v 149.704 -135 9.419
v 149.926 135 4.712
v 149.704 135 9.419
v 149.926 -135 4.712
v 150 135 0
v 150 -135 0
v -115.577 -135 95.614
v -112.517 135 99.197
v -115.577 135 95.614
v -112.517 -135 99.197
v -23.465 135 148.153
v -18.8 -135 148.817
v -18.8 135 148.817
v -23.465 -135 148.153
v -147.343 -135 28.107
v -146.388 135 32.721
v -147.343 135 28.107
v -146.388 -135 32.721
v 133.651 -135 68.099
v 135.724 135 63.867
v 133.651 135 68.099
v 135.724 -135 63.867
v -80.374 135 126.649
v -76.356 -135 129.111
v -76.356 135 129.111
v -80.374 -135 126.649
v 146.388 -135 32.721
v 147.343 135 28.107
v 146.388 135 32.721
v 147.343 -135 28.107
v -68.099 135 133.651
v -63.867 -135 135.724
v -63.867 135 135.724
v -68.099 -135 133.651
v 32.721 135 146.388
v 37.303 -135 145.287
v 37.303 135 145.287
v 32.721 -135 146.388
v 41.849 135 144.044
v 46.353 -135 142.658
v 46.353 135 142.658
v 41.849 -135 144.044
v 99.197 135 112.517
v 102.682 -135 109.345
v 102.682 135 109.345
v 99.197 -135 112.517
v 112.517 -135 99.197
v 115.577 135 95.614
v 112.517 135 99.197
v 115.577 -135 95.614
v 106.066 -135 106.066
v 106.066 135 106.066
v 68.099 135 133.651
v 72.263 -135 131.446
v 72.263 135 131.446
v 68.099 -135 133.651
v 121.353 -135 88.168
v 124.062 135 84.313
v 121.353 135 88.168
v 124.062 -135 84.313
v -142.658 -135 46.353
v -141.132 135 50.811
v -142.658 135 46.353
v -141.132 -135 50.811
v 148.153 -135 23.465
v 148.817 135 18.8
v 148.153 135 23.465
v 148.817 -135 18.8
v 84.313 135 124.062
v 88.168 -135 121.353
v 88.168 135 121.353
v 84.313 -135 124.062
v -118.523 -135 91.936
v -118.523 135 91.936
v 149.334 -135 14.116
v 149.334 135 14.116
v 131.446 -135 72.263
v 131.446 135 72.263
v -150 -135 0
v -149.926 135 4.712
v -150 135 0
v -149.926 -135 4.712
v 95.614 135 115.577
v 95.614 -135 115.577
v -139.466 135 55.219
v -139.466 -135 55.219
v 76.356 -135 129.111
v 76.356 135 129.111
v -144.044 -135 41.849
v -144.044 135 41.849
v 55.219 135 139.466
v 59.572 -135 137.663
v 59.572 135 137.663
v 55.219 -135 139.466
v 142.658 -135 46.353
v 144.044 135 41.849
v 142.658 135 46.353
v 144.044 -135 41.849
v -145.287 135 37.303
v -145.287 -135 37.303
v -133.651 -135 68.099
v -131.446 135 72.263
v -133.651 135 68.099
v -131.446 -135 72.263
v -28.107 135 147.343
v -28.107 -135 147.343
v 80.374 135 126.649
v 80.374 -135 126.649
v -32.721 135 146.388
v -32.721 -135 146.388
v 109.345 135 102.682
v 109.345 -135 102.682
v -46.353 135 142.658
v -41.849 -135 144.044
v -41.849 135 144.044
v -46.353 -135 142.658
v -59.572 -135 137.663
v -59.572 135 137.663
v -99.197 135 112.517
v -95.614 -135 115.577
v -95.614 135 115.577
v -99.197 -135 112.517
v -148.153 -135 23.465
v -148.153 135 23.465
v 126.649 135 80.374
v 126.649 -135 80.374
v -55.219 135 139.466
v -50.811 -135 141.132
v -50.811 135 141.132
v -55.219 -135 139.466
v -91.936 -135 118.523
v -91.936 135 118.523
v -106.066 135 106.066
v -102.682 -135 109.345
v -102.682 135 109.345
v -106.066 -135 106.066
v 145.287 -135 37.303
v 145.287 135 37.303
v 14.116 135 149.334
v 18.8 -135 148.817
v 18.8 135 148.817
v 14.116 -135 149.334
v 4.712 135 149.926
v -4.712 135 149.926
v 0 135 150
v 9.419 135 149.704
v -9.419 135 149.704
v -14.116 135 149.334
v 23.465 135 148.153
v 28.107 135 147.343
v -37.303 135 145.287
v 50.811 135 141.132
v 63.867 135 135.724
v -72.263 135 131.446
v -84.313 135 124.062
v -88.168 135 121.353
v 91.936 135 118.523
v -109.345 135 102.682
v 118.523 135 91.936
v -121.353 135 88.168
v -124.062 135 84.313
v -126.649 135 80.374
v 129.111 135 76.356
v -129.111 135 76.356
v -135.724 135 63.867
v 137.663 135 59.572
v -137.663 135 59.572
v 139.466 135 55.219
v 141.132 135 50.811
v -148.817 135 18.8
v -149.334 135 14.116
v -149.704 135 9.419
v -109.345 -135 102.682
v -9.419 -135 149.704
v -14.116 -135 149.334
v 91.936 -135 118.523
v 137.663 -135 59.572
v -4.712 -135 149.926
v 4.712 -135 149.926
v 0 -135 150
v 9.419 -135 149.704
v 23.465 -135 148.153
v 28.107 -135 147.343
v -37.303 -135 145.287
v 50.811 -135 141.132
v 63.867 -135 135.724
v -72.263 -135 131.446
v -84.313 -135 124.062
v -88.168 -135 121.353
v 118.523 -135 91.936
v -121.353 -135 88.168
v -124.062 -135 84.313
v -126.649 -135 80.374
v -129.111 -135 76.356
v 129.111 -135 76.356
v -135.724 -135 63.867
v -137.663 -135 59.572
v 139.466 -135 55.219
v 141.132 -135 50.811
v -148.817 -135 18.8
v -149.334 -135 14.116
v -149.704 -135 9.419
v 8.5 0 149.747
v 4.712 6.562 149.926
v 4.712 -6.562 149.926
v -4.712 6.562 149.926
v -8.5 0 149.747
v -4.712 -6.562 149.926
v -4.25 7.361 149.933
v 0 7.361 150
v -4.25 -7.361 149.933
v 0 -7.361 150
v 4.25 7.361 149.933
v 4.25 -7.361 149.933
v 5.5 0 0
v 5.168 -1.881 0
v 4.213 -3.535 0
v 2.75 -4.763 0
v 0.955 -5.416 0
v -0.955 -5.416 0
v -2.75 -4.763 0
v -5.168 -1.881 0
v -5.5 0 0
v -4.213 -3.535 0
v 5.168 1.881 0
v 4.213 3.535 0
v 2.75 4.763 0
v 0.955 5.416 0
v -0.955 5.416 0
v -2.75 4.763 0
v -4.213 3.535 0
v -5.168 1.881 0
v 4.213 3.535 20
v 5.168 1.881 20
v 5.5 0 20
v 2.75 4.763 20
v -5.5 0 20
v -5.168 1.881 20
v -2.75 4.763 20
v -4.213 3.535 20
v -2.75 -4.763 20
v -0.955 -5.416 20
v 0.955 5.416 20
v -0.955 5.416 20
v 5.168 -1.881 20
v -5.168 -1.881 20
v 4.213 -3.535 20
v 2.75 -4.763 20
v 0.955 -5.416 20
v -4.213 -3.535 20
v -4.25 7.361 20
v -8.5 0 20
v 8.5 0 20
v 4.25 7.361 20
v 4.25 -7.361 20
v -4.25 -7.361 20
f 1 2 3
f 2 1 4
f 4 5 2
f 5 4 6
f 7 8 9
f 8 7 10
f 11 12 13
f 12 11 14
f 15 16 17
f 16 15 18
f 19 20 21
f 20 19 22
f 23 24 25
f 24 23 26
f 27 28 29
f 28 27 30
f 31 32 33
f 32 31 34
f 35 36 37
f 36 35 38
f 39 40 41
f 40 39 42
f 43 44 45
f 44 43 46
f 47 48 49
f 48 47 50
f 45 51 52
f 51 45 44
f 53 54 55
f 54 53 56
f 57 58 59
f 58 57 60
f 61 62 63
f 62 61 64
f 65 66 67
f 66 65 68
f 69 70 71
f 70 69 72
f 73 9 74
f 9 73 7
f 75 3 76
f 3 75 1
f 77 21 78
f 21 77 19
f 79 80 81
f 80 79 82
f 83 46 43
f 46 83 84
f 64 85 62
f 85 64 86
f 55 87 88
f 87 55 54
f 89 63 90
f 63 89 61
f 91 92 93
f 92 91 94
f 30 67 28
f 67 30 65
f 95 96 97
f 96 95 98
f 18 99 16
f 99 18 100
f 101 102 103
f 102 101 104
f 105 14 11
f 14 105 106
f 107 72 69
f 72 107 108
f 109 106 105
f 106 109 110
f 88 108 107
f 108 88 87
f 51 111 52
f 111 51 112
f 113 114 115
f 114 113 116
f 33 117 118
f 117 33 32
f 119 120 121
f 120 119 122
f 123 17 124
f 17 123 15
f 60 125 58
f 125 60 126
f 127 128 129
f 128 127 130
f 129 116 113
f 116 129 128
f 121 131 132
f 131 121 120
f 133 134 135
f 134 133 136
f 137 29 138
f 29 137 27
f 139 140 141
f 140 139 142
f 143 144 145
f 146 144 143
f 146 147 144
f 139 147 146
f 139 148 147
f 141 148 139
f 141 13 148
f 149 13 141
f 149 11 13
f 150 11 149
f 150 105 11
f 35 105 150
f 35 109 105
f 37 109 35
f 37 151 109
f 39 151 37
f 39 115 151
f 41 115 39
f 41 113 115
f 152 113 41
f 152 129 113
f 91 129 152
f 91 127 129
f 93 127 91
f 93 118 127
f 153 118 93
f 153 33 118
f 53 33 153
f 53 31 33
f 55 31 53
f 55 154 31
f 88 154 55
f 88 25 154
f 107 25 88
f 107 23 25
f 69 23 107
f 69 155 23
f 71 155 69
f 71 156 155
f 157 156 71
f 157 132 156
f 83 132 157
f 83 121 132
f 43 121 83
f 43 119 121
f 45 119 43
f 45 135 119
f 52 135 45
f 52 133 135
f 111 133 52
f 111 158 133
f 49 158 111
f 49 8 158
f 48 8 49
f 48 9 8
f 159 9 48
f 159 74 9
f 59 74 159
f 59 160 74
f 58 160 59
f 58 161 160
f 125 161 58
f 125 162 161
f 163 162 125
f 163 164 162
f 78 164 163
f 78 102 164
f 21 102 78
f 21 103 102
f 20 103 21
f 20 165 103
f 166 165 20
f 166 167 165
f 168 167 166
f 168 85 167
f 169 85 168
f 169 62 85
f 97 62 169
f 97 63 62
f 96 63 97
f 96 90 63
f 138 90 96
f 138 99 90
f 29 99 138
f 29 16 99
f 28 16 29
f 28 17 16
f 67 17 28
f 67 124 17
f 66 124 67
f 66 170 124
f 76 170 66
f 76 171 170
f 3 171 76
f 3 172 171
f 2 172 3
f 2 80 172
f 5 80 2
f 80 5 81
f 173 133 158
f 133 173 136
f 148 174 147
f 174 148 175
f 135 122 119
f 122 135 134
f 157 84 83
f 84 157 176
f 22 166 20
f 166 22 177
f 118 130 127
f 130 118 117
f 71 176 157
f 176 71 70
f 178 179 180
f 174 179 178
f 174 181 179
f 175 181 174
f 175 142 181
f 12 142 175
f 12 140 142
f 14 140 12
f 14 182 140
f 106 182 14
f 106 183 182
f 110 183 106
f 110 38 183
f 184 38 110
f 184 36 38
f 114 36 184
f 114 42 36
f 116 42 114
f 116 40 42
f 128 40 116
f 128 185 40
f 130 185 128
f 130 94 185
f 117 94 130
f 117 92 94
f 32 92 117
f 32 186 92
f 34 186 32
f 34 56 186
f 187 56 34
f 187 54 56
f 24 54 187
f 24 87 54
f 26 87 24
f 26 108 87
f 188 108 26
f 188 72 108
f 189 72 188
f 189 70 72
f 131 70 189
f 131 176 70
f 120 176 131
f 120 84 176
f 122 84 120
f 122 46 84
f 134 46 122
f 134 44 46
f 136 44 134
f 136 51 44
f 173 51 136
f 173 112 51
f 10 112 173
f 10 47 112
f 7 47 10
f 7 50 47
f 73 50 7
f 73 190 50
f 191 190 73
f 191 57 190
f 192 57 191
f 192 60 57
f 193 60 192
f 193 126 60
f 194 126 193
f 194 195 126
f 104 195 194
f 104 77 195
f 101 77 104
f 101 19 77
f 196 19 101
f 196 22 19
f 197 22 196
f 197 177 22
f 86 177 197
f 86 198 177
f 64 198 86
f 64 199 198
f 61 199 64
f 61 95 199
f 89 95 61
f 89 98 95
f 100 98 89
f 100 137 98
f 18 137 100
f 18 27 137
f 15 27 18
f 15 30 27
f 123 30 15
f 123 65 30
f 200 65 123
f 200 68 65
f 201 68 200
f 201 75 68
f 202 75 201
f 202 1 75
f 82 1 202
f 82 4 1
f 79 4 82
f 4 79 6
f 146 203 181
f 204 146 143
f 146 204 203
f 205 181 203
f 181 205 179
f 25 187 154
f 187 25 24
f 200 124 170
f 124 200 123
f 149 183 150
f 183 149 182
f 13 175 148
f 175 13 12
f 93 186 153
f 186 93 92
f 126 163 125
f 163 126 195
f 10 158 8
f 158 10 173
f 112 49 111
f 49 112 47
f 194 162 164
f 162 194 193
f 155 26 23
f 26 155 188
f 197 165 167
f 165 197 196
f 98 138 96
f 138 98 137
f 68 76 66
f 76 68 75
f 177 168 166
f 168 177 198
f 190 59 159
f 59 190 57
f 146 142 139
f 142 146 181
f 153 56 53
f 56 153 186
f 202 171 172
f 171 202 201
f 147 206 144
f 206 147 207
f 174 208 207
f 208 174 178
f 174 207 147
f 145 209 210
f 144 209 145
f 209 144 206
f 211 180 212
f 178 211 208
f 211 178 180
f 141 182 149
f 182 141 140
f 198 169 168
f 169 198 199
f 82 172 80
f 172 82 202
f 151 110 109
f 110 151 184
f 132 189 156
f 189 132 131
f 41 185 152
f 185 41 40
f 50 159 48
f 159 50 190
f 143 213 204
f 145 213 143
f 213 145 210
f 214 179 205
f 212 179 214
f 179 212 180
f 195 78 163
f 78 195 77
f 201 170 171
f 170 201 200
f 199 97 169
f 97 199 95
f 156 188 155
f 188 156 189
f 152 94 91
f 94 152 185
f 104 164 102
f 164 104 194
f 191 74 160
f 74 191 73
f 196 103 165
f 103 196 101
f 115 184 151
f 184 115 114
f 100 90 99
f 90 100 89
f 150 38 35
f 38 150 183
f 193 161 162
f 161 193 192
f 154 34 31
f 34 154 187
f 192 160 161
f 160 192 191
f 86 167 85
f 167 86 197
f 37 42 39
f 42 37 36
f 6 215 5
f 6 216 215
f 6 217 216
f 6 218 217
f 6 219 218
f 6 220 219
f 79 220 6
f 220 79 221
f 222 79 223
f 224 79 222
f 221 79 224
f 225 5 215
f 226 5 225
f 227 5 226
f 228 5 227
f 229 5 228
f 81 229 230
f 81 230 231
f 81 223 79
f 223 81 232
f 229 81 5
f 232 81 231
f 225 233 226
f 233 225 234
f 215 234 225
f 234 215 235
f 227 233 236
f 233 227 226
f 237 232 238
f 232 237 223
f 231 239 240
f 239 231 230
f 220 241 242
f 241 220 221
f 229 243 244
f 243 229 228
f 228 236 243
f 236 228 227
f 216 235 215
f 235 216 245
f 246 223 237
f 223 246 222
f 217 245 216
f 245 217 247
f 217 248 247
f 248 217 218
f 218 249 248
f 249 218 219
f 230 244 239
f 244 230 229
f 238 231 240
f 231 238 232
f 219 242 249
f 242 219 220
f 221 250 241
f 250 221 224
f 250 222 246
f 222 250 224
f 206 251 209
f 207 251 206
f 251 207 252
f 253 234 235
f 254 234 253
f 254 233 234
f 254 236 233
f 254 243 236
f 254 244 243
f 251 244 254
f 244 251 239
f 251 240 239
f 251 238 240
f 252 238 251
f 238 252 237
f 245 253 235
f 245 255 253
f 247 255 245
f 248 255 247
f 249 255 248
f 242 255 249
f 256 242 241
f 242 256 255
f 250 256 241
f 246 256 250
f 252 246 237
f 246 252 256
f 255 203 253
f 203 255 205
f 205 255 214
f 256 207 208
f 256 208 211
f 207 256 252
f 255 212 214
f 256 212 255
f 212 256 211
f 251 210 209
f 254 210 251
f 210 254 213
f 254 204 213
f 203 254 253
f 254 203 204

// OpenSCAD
r=150; //Radius of Hemisphere
a=10; //Screw Diameter
b=16; //Screw nut Diameter
x=20; //Nut Depth

ankle_board_uni();

module ankle_board_uni(){
difference(){
rotate([90,0,0])cylinder(h=2*r*.9,r=r, center=true, $fn=200);
translate([0,0,(r+5)/-2])cube([r*2.3,r*2.3,r+5],center = true);
translate([0,0,-2])cylinder(r+5,(a+1)/2,(a+1)/2);
translate([0,0,r-(r-x)])hexagon(r+5,(b+1)/2);
}
}

module reg_polygon(sides,radius)
{
  function dia(r) = sqrt(pow(r*2,2)/2);  //sqrt((r*2^2)/2) if only we had an exponention op
  if(sides<2) square([radius,0]);
  if(sides==3) triangle(radius);
  if(sides==4) square([dia(radius),dia(radius)],center=true);
  if(sides>4) circle(r=radius,$fn=sides);
}

module hexagonf(radius)
{
  reg_polygon(6,radius);
}

module hexagon(height,radius) 
{
  linear_extrude(height=height) hexagonf(radius);
}
